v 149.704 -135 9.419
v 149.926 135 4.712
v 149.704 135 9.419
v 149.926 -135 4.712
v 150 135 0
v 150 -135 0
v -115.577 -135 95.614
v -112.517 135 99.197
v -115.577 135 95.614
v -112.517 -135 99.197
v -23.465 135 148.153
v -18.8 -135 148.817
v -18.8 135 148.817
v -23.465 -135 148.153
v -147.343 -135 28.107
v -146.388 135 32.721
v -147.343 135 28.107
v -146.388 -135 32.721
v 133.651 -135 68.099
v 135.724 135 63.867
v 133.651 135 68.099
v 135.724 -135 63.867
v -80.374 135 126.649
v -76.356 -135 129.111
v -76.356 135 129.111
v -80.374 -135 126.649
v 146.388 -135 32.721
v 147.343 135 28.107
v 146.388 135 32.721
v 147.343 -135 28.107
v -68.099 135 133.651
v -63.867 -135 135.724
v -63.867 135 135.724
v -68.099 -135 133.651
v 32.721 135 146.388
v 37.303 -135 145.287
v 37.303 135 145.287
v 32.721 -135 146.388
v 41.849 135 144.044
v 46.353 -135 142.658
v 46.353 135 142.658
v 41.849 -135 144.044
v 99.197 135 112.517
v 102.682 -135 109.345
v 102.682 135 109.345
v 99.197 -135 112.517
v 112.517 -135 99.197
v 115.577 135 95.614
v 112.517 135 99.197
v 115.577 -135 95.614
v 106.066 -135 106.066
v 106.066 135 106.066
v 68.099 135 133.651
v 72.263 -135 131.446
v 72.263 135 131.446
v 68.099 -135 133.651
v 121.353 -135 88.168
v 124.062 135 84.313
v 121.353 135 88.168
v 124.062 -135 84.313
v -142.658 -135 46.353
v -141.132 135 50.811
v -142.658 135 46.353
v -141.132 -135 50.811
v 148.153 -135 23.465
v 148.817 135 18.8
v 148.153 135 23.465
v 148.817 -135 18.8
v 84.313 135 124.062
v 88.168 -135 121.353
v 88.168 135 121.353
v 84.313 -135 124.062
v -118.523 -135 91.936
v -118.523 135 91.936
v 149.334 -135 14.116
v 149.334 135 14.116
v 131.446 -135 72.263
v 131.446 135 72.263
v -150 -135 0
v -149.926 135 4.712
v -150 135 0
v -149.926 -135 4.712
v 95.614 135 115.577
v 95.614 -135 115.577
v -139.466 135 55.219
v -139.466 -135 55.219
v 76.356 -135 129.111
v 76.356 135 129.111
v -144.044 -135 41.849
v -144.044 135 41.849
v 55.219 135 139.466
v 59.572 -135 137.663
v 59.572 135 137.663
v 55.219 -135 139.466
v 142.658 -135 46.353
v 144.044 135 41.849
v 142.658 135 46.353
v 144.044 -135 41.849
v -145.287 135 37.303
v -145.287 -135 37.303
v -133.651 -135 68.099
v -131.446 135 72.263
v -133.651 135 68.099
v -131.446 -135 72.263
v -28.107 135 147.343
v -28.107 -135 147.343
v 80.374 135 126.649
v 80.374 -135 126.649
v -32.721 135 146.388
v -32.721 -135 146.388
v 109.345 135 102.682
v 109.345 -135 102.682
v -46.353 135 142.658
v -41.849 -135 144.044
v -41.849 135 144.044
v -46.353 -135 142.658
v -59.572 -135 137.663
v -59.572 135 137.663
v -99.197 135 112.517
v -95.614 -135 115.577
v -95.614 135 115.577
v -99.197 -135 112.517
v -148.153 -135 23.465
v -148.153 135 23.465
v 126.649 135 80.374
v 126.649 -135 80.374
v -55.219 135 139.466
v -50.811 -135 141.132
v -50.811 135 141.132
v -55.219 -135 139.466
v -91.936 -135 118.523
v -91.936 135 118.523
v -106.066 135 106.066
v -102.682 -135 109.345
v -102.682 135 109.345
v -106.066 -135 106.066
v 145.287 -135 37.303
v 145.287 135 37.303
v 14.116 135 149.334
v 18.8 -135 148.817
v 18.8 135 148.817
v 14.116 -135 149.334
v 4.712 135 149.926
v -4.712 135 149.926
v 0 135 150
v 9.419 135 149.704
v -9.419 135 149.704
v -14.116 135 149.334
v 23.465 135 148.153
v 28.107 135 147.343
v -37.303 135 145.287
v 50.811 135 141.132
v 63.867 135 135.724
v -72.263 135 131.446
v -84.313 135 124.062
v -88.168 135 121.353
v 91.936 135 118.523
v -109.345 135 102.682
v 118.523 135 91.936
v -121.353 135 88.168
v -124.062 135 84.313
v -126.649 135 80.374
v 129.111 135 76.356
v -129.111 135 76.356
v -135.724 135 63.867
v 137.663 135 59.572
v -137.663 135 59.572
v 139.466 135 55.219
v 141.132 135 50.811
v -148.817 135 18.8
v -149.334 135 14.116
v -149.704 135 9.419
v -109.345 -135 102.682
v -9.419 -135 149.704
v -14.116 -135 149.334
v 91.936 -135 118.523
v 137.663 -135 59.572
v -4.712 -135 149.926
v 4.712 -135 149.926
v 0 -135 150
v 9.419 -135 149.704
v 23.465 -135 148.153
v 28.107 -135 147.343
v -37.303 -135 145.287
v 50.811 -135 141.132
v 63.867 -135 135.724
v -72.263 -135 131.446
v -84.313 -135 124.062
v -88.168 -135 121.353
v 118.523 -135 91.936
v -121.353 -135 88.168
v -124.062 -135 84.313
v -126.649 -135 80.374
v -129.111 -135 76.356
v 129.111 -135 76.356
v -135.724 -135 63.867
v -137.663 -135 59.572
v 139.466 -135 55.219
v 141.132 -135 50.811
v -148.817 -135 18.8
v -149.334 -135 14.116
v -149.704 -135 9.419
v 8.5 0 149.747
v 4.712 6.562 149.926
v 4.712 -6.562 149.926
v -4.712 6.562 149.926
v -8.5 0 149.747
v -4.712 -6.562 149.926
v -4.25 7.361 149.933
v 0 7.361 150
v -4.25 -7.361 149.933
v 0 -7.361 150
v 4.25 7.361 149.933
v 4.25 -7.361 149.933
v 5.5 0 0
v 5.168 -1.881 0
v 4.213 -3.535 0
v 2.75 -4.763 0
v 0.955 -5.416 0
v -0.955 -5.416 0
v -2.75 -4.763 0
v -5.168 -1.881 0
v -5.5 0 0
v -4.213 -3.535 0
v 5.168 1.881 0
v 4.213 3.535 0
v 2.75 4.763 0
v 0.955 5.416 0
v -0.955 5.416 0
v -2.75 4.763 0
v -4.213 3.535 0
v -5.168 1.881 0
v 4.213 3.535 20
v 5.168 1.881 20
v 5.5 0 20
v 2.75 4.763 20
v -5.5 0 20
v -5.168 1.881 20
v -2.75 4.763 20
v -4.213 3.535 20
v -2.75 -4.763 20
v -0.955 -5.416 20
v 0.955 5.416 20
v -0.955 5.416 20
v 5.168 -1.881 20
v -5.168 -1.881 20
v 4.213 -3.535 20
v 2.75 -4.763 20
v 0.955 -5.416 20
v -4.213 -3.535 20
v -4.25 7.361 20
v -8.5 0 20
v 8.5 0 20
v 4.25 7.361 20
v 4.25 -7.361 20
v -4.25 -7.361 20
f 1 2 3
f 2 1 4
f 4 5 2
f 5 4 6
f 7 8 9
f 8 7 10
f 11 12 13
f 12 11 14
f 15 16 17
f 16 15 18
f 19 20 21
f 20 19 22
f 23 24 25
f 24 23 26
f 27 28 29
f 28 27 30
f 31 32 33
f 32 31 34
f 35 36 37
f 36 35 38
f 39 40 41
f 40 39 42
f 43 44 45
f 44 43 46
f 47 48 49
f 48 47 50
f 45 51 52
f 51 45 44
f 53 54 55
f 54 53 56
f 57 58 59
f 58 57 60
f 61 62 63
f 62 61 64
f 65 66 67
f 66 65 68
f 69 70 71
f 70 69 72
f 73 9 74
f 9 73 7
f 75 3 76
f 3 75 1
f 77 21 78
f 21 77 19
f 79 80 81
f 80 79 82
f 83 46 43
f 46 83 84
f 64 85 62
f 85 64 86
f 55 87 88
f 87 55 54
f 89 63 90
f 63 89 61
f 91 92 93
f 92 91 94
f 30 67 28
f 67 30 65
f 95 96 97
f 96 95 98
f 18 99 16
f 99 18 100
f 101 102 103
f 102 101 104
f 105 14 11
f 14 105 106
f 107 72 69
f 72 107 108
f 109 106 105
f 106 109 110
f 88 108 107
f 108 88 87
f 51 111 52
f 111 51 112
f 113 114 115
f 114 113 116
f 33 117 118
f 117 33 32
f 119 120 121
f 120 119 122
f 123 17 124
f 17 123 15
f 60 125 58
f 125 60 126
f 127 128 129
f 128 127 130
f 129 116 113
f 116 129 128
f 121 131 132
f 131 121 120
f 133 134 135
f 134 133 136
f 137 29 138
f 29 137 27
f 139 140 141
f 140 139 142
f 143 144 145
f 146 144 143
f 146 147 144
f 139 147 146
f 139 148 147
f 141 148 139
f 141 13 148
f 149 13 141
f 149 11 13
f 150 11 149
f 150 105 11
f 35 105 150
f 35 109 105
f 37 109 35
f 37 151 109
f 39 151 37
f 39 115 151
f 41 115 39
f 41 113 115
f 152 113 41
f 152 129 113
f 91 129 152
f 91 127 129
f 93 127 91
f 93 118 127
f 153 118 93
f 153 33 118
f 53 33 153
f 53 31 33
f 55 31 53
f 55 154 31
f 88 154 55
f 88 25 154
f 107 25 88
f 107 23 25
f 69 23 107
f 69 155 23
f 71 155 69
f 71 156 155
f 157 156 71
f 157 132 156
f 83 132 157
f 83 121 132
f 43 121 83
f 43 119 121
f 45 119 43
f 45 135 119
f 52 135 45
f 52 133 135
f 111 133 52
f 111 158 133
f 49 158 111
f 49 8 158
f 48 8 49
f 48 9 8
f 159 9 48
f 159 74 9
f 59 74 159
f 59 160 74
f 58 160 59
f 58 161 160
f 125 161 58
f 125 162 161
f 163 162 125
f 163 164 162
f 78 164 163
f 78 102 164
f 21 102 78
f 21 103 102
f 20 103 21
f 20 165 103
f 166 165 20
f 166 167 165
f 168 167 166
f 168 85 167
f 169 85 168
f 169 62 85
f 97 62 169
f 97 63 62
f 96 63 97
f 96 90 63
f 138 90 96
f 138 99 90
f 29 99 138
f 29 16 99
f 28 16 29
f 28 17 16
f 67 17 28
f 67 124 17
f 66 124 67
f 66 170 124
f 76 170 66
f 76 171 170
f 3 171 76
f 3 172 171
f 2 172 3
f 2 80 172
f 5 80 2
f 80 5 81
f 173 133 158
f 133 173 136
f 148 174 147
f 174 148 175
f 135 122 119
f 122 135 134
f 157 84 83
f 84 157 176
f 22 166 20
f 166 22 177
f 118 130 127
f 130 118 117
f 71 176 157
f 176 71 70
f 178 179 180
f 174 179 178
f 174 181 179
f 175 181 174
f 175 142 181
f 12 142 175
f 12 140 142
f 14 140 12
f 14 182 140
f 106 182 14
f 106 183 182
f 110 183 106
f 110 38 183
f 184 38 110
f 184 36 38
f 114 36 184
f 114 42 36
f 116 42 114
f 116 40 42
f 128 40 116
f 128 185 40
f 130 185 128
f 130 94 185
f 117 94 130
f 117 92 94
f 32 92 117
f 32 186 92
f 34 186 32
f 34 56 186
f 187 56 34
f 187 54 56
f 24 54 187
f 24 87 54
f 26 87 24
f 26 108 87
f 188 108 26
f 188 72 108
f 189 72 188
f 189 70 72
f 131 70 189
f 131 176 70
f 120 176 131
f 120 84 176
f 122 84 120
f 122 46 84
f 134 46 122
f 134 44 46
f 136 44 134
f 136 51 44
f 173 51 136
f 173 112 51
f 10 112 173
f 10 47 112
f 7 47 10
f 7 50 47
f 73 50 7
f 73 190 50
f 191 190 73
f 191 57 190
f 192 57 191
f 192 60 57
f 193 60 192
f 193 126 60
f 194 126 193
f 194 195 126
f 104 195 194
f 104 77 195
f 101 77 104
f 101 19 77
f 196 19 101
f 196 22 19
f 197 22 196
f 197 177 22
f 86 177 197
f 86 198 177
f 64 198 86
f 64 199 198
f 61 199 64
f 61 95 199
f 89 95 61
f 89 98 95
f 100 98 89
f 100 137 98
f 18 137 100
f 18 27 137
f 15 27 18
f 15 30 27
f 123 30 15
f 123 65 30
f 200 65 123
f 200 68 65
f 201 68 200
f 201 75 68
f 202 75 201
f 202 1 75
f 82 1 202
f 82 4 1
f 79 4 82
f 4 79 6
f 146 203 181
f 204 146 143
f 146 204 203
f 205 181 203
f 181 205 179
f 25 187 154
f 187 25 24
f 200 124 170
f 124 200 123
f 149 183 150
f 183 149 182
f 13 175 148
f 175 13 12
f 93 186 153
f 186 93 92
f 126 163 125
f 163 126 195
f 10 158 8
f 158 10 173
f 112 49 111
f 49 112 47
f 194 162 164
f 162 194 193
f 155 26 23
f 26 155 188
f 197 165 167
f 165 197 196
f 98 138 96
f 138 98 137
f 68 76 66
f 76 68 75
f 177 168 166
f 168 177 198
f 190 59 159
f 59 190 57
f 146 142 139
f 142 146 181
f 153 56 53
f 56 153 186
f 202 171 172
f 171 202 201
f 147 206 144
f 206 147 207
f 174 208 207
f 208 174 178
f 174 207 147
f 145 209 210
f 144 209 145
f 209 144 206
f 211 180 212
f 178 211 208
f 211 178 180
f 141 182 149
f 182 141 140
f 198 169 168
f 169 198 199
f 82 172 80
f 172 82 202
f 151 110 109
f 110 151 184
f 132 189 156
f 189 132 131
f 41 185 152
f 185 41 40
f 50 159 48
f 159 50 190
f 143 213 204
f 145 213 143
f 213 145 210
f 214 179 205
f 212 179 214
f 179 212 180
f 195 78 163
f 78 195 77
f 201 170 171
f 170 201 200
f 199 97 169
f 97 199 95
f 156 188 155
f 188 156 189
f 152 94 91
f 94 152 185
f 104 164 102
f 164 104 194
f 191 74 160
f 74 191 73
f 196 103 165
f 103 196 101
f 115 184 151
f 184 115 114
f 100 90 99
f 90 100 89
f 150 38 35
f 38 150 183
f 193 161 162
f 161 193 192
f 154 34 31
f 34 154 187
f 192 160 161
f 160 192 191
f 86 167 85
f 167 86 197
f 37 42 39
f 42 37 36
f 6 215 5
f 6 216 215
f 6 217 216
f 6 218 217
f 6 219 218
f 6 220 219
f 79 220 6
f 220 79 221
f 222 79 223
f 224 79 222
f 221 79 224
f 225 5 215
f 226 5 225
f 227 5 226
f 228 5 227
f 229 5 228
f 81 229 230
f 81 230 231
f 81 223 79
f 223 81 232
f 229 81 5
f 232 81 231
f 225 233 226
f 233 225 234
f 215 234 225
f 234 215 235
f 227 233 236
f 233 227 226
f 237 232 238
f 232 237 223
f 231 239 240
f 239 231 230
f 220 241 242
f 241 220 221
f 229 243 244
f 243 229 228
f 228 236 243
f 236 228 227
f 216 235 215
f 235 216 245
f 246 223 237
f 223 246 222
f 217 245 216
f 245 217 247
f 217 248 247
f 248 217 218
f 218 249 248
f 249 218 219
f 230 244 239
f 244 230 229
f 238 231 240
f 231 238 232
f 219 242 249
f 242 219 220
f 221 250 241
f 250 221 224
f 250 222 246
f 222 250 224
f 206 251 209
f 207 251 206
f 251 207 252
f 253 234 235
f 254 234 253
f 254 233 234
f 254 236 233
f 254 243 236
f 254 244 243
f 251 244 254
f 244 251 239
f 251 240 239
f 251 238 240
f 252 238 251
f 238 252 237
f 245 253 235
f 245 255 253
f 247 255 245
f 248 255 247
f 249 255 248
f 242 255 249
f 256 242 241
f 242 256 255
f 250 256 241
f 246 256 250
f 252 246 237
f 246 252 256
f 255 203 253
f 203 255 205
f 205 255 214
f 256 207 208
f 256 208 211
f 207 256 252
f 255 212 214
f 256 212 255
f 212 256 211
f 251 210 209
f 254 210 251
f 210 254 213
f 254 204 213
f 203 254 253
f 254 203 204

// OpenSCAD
r=150; //Radius of Hemisphere
a=10; //Screw Diameter
b=16; //Screw nut Diameter
x=20; //Nut Depth

ankle_board_uni();

module ankle_board_uni(){
difference(){
rotate([90,0,0])cylinder(h=2*r*.9,r=r, center=true, $fn=200);
translate([0,0,(r+5)/-2])cube([r*2.3,r*2.3,r+5],center = true);
translate([0,0,-2])cylinder(r+5,(a+1)/2,(a+1)/2);
translate([0,0,r-(r-x)])hexagon(r+5,(b+1)/2);
}
}

module reg_polygon(sides,radius)
{
  function dia(r) = sqrt(pow(r*2,2)/2);  //sqrt((r*2^2)/2) if only we had an exponention op
  if(sides<2) square([radius,0]);
  if(sides==3) triangle(radius);
  if(sides==4) square([dia(radius),dia(radius)],center=true);
  if(sides>4) circle(r=radius,$fn=sides);
}

module hexagonf(radius)
{
  reg_polygon(6,radius);
}

module hexagon(height,radius) 
{
  linear_extrude(height=height) hexagonf(radius);
}
